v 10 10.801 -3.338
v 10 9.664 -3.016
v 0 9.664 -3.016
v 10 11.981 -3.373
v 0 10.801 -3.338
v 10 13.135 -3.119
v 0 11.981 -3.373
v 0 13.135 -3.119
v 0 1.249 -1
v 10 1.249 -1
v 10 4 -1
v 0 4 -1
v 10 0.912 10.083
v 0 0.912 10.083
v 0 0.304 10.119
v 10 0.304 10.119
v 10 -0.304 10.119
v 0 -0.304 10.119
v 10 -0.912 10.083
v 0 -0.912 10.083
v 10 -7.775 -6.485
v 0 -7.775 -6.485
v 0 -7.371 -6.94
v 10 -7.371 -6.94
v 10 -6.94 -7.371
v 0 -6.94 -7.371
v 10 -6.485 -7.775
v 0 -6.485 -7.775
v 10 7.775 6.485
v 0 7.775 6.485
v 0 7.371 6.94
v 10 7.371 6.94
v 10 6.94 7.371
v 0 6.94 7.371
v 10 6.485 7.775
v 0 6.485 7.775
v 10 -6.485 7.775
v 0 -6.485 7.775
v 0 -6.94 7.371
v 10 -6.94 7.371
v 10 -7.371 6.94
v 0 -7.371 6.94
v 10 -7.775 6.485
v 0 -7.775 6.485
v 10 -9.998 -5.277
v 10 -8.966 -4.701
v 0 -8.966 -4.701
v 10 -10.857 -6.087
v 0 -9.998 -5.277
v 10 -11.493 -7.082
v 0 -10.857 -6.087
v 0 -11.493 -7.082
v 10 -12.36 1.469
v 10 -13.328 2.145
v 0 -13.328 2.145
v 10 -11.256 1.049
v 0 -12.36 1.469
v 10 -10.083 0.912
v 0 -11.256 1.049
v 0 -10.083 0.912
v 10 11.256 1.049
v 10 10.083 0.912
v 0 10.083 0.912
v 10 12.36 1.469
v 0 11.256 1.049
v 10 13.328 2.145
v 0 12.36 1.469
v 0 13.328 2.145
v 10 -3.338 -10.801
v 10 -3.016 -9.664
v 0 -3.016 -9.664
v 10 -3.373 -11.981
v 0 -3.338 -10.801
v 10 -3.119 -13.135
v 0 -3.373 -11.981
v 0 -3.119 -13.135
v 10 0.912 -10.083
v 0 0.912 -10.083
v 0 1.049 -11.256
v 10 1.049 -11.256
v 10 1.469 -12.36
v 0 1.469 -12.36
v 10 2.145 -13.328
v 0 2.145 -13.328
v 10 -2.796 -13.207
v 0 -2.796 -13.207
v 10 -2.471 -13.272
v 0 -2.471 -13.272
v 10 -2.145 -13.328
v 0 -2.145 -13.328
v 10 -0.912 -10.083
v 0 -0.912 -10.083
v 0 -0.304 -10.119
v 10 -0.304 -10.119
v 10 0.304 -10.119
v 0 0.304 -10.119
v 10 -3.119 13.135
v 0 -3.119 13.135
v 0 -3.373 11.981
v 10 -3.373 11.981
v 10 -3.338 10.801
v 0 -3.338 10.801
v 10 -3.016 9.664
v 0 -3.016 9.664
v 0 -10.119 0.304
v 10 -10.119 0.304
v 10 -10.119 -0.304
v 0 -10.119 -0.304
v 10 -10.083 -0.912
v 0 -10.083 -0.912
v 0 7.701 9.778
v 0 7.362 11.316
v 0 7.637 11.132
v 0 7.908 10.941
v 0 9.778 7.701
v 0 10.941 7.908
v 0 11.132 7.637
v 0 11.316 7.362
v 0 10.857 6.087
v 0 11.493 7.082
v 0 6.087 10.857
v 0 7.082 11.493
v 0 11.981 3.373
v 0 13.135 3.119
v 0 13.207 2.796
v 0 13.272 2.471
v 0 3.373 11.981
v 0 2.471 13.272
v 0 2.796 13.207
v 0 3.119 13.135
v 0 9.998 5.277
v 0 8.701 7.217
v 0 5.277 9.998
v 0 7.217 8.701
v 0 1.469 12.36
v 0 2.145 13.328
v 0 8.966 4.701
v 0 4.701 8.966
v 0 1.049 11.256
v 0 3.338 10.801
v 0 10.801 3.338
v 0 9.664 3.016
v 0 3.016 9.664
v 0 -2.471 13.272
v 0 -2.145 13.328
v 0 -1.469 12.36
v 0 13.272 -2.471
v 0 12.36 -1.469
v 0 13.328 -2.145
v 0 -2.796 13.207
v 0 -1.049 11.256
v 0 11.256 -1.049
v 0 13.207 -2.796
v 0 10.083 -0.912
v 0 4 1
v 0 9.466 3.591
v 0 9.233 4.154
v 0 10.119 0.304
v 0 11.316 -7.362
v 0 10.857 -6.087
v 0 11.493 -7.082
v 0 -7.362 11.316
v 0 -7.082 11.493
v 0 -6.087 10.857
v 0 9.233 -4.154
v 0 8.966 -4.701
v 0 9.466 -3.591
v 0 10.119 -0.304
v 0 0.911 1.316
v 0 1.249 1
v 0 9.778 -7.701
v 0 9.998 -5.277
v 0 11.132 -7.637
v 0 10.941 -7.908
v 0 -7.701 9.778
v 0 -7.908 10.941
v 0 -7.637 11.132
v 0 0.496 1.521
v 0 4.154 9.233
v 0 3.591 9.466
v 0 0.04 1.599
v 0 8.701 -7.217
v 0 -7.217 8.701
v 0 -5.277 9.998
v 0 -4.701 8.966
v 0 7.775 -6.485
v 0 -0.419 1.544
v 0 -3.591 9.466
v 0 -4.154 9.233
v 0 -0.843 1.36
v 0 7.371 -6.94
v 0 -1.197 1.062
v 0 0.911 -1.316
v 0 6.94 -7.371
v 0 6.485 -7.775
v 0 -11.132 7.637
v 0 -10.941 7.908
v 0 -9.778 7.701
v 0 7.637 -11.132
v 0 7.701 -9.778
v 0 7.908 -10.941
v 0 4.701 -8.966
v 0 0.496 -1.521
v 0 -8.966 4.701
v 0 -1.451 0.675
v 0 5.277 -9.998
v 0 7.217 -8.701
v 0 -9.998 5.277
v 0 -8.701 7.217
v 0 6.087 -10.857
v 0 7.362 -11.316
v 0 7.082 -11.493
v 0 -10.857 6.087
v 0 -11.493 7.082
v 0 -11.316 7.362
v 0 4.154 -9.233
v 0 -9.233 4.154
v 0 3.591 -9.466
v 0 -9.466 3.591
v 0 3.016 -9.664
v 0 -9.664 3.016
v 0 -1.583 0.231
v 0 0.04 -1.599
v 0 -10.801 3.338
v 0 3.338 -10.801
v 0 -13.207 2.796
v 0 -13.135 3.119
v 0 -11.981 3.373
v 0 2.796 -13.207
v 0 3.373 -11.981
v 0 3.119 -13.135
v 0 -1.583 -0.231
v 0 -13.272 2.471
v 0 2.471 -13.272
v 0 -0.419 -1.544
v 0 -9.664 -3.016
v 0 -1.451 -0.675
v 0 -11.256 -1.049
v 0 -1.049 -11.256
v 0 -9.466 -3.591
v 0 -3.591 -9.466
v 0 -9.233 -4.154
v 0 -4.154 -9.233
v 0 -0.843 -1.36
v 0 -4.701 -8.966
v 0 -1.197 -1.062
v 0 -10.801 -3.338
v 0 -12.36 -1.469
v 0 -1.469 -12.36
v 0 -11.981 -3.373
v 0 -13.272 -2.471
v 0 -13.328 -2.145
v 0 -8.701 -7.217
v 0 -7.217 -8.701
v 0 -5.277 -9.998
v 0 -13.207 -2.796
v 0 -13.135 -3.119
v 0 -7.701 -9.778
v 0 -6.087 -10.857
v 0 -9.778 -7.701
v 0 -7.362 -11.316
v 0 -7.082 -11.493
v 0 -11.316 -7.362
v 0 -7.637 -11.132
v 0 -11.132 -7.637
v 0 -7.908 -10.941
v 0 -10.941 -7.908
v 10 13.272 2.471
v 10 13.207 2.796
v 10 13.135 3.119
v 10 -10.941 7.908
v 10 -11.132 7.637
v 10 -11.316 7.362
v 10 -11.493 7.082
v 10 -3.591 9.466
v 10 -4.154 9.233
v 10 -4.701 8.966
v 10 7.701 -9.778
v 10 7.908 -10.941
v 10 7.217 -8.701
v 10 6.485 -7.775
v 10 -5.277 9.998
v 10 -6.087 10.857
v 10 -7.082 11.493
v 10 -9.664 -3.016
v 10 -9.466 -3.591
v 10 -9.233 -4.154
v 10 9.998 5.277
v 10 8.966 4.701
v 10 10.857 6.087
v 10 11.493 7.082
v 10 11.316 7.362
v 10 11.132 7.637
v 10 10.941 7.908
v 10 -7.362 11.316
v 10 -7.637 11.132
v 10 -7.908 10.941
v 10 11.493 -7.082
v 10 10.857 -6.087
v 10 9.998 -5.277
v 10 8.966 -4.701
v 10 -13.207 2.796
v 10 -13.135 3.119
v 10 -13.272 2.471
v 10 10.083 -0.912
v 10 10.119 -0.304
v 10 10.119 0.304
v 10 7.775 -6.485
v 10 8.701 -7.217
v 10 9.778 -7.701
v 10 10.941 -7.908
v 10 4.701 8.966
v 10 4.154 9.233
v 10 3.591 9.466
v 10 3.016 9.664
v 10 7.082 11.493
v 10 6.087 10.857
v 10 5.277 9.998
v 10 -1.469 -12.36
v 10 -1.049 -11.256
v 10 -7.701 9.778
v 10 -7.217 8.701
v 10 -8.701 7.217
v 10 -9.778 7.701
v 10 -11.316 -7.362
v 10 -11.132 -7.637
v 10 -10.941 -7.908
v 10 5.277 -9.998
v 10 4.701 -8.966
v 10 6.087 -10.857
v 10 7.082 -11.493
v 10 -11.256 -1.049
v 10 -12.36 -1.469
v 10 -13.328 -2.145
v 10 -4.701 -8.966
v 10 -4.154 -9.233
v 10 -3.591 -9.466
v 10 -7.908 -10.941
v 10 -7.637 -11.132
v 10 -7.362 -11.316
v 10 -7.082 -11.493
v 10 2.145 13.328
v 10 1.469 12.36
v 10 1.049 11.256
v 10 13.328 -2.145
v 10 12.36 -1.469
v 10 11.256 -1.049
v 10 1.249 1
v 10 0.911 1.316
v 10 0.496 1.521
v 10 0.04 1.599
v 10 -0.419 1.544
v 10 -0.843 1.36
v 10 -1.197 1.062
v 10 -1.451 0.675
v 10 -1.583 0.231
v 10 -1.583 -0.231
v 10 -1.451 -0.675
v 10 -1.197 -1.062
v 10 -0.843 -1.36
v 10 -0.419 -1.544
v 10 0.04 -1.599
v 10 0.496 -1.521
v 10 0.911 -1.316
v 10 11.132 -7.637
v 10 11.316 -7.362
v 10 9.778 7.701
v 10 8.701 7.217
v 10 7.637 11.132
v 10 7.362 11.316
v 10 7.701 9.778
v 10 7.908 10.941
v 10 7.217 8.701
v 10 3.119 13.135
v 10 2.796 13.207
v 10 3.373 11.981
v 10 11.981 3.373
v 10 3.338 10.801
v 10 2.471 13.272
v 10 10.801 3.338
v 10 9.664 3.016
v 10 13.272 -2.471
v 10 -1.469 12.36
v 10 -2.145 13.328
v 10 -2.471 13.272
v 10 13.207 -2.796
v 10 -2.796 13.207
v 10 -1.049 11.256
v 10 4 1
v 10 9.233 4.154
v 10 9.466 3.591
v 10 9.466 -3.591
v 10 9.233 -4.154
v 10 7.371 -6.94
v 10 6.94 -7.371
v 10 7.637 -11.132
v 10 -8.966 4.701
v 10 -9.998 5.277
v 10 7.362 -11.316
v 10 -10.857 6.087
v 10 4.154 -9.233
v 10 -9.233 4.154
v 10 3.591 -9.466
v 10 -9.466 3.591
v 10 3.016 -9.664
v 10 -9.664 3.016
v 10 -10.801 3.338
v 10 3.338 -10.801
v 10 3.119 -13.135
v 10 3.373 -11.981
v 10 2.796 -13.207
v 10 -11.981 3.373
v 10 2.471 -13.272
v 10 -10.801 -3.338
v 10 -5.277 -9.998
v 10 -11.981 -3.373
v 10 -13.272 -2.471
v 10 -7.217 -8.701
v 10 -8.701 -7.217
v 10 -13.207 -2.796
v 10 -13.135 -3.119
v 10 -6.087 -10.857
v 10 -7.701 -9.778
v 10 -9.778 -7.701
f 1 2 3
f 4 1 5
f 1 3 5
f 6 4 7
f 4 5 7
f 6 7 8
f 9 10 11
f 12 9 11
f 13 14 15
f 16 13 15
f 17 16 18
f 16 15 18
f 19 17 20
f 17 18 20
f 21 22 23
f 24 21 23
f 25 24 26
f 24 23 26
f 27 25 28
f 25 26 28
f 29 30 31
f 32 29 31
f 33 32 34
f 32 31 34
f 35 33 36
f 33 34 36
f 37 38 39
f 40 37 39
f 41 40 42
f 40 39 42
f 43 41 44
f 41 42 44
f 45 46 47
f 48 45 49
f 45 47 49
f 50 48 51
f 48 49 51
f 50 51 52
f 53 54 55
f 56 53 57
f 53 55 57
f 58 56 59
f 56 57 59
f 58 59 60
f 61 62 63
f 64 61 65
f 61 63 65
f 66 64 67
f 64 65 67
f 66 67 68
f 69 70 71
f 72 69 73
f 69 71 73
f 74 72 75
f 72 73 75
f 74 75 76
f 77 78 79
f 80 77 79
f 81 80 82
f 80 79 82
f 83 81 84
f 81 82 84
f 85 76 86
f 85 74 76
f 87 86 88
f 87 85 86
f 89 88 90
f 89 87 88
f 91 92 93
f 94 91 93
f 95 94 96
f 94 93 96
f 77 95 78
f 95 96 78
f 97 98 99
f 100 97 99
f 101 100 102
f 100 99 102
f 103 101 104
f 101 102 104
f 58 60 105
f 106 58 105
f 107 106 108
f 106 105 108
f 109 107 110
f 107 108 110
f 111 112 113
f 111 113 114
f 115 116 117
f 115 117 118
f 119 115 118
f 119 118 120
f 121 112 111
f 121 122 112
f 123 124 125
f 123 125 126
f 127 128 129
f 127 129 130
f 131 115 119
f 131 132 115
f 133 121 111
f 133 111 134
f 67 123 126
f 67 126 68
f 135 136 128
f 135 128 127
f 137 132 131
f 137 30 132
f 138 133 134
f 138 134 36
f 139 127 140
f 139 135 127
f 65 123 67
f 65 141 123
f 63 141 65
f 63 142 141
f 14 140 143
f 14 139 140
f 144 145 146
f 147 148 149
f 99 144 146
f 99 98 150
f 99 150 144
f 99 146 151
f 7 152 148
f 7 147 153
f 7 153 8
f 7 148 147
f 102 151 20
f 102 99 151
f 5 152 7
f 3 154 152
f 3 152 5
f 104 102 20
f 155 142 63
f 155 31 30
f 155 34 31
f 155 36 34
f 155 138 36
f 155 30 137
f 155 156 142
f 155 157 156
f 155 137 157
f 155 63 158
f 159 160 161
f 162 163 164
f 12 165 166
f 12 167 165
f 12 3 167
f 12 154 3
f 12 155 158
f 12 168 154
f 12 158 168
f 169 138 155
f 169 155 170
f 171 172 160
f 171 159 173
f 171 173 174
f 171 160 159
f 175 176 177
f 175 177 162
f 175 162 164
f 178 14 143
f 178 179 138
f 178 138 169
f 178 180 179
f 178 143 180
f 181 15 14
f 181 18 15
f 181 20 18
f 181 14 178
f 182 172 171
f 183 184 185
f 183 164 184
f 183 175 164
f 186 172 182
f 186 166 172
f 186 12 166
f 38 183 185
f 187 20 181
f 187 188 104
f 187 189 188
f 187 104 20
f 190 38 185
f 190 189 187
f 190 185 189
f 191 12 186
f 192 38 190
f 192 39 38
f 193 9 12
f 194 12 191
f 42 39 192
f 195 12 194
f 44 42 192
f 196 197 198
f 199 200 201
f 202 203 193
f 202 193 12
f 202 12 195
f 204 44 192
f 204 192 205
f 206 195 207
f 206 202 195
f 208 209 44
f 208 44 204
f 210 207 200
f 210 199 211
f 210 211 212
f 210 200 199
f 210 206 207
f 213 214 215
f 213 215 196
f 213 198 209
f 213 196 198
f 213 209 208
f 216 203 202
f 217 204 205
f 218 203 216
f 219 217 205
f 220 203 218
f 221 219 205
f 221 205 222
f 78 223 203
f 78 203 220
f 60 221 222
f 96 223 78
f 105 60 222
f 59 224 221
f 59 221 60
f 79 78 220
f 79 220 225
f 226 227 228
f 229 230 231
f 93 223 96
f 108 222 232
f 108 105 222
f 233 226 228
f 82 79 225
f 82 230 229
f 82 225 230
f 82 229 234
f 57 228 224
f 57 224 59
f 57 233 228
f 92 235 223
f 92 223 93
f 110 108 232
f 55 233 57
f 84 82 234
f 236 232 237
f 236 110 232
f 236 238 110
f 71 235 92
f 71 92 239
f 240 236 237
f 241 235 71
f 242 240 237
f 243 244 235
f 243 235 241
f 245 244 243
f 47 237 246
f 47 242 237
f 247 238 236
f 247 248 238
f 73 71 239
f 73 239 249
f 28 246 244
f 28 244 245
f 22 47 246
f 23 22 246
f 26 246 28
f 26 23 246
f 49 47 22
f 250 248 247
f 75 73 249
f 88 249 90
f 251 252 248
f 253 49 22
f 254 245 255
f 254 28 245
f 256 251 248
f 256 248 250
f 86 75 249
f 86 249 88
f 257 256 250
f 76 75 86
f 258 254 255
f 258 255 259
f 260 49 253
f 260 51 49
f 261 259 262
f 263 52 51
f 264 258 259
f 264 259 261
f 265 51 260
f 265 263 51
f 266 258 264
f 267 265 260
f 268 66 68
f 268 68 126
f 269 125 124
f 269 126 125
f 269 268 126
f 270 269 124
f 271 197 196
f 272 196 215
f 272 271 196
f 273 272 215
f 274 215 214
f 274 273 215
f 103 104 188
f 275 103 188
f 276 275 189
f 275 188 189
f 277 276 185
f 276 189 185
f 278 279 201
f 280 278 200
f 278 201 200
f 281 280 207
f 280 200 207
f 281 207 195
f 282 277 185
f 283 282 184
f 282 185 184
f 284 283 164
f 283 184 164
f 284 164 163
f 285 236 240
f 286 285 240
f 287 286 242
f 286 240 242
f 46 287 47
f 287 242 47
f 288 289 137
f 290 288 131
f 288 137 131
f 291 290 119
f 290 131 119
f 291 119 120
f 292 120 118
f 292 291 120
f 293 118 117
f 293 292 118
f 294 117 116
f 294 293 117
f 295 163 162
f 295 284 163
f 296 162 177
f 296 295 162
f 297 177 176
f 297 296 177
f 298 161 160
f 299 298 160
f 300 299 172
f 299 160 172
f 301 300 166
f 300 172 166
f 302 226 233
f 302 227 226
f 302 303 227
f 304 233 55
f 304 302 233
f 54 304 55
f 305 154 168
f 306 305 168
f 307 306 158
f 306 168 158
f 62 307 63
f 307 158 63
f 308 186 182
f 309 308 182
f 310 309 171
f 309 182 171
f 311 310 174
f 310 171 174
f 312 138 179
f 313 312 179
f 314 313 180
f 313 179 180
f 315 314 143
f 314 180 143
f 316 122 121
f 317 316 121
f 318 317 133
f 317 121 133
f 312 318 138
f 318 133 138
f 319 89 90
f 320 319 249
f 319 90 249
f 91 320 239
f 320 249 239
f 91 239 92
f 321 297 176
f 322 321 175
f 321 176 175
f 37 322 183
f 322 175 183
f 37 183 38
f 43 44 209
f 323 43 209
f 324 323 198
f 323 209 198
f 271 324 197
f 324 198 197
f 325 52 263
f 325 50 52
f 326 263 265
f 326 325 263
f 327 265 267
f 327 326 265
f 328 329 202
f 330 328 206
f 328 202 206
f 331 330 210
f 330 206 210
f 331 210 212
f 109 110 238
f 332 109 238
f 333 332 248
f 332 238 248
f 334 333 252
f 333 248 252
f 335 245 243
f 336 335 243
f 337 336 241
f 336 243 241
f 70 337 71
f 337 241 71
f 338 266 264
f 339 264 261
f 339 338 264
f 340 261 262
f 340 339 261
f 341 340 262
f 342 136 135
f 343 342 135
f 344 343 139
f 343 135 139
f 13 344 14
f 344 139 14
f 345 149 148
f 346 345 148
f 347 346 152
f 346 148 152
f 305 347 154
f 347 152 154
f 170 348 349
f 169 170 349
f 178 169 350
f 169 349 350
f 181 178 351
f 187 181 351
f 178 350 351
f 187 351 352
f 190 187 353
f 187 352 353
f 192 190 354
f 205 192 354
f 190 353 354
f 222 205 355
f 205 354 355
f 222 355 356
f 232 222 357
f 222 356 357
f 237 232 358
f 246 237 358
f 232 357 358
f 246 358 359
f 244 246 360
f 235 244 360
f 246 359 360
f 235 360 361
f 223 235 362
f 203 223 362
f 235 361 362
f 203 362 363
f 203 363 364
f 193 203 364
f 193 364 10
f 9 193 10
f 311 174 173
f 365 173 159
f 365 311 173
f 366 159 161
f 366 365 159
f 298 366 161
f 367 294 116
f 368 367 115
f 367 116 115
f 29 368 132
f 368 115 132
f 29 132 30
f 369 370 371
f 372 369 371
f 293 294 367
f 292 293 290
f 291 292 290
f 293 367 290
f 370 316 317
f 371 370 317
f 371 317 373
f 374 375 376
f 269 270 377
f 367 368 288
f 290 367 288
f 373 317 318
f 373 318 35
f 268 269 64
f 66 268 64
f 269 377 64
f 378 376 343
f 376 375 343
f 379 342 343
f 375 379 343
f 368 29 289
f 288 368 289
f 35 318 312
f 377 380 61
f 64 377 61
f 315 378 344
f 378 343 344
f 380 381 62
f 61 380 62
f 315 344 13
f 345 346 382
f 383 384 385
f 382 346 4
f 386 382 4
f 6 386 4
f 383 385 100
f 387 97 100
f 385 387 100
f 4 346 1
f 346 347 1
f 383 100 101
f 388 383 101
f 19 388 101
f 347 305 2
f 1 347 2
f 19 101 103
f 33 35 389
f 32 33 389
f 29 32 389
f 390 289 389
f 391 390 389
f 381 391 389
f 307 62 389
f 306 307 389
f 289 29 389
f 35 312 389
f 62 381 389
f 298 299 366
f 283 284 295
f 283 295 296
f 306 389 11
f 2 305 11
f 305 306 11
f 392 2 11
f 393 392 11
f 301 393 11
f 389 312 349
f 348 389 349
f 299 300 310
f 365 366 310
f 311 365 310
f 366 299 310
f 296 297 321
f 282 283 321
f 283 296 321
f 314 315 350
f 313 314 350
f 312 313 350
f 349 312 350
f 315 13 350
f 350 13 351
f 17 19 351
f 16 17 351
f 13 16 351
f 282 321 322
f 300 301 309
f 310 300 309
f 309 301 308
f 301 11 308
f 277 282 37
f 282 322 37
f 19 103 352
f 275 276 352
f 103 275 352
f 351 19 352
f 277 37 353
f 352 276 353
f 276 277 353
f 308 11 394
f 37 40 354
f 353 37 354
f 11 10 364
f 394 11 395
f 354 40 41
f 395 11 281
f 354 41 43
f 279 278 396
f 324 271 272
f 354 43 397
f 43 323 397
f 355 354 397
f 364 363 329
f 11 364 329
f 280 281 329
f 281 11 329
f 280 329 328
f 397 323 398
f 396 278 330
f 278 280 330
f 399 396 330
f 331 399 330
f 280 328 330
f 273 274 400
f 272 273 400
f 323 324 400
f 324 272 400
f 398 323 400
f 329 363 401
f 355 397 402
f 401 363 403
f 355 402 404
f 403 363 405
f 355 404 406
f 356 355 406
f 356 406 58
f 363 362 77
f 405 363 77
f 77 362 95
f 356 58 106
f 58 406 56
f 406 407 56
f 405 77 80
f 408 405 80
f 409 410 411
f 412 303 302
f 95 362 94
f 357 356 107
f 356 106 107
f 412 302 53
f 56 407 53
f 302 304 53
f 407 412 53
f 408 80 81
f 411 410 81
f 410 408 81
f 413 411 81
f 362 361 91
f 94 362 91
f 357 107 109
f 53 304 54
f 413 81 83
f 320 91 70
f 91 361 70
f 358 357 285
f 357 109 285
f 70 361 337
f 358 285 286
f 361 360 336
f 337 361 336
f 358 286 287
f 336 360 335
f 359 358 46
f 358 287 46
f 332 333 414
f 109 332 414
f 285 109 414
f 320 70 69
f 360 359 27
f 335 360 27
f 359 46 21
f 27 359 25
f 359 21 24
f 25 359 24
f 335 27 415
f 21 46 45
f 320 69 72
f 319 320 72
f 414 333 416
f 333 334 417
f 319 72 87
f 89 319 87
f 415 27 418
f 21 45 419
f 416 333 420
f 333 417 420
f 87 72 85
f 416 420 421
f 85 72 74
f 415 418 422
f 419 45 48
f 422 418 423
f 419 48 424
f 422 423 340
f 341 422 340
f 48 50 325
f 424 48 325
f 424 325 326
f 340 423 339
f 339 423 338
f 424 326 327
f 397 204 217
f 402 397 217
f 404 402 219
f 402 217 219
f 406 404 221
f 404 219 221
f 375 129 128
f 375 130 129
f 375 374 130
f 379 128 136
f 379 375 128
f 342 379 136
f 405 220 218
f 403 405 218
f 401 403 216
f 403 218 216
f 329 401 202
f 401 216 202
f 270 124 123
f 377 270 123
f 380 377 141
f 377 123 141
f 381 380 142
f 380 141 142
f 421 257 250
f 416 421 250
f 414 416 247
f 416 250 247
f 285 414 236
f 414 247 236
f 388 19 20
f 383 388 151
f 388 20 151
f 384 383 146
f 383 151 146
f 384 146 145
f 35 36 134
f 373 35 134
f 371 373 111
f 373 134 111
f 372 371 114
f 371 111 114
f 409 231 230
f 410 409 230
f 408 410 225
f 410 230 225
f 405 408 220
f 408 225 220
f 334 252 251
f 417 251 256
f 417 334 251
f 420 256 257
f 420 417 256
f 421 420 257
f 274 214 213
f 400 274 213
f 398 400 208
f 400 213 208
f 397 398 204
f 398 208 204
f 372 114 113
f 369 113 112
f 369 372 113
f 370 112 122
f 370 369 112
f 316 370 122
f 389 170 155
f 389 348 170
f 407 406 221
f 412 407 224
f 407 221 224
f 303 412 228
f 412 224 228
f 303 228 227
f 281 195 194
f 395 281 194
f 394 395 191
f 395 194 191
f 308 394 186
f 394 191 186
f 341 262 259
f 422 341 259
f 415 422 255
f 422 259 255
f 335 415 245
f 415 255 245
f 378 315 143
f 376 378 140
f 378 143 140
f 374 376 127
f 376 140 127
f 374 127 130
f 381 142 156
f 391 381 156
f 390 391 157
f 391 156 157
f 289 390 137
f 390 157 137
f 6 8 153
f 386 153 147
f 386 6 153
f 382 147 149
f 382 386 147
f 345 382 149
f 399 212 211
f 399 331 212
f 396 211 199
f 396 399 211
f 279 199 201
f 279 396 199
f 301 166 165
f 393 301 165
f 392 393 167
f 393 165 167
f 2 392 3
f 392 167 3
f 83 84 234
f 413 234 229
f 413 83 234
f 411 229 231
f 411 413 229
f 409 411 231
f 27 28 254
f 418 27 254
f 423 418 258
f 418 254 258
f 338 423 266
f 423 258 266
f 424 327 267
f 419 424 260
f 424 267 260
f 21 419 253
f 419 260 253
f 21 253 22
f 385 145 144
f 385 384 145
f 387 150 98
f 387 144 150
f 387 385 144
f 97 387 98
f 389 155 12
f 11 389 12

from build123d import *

# Parameters (mm, degrees)
BASPROSKE_W         = 10
BASPROSKE_H         = 13.5
TOOTHCUT_DEPTH      = 22.552262062
TEETHCUTS_COUNT     = 16
TEETHCUTS_ANGLE     = 337.5
BORSKE_R            = 3
BORE_DEPTH          = 50.0000508
KEYSKE_W            = 2
KEYSKE_H            = 4
KEYWAY_DEPTH        = 50.0000508
SKETCH1_R           = 5.698738584
BOSS_EXTRUDE1_DEPTH = 10


with BuildPart() as part:
    # BasProSke → Base-Revolve (revolve)
    with BuildSketch(Plane(origin=(0, 0, 0), x_dir=(1, 0, 0), z_dir=(0, 1, 0)), mode=Mode.PRIVATE) as base_revolve_sk:
        with Locations((5, 6.75)):
            Rectangle(BASPROSKE_W, BASPROSKE_H)
    revolve(base_revolve_sk.sketch.rotate(Axis((-10, 0, 0), (1, 0, 0)), 180), axis=Axis((-10, 0, 0), (1, 0, 0)))

    # TooCutSke → ToothCut (cut, through all)
    with BuildSketch(Plane(origin=(0, 0, 0), x_dir=(0, 0, -1), z_dir=(1, 0, 0))):
        with BuildLine():
            ThreePointArc((0.91215808, 10.08282419), (0, 10.124), (-0.91215808, 10.08282419))
            ThreePointArc((-0.91215808, 10.08282419), (-1.23025345, 11.835184302), (-2.165362868, 13.35094187))
            ThreePointArc((-2.165362868, 13.35094187), (0, 13.5254), (2.165362868, 13.35094187))
            ThreePointArc((2.165362868, 13.35094187), (1.23025345, 11.835184302), (0.91215808, 10.08282419))
        make_face()
    toothcut = extrude(amount=TOOTHCUT_DEPTH, mode=Mode.SUBTRACT)

    # TeethCuts: ToothCut ×16 about axis
    teethcuts_axis = Axis((-10, 0, 0), (1, 0, 0))
    for i in range(1, TEETHCUTS_COUNT):
        add(toothcut.rotate(teethcuts_axis, i * TEETHCUTS_ANGLE / (TEETHCUTS_COUNT - 1)), mode=Mode.SUBTRACT)

    # BorSke → Bore (cut, symmetric)
    with BuildSketch(Plane(origin=(0, 0, 0), x_dir=(0, 0, -1), z_dir=(1, 0, 0))):
        with Locations(Location((0, 0, 0), (0, 0, 180))):
            Circle(BORSKE_R)
    extrude(amount=BORE_DEPTH, both=True, mode=Mode.SUBTRACT)

    # KeySke → Keyway (cut, symmetric)
    with BuildSketch(Plane(origin=(0, 0, 0), x_dir=(0, 0, -1), z_dir=(1, 0, 0))):
        with Locations((0, 2)):
            Rectangle(KEYSKE_W, KEYSKE_H)
    extrude(amount=KEYWAY_DEPTH, both=True, mode=Mode.SUBTRACT)

    # Sketch1 → Boss-Extrude1 (add, through all)
    with BuildSketch(Plane(origin=(10, 0, 0), x_dir=(0, 0, -1), z_dir=(1, 0, 0))):
        Circle(SKETCH1_R)
        with BuildLine():
            Line((-1, 4), (-1, 1.2489996))
            ThreePointArc((-1, 1.2489996), (0, -1.6), (1, 1.2489996))
            Line((1, 1.2489996), (1, 4))
            Line((1, 4), (-1, 4))
        make_face(mode=Mode.SUBTRACT)
    extrude(amount=-BOSS_EXTRUDE1_DEPTH)


solid = part.part
